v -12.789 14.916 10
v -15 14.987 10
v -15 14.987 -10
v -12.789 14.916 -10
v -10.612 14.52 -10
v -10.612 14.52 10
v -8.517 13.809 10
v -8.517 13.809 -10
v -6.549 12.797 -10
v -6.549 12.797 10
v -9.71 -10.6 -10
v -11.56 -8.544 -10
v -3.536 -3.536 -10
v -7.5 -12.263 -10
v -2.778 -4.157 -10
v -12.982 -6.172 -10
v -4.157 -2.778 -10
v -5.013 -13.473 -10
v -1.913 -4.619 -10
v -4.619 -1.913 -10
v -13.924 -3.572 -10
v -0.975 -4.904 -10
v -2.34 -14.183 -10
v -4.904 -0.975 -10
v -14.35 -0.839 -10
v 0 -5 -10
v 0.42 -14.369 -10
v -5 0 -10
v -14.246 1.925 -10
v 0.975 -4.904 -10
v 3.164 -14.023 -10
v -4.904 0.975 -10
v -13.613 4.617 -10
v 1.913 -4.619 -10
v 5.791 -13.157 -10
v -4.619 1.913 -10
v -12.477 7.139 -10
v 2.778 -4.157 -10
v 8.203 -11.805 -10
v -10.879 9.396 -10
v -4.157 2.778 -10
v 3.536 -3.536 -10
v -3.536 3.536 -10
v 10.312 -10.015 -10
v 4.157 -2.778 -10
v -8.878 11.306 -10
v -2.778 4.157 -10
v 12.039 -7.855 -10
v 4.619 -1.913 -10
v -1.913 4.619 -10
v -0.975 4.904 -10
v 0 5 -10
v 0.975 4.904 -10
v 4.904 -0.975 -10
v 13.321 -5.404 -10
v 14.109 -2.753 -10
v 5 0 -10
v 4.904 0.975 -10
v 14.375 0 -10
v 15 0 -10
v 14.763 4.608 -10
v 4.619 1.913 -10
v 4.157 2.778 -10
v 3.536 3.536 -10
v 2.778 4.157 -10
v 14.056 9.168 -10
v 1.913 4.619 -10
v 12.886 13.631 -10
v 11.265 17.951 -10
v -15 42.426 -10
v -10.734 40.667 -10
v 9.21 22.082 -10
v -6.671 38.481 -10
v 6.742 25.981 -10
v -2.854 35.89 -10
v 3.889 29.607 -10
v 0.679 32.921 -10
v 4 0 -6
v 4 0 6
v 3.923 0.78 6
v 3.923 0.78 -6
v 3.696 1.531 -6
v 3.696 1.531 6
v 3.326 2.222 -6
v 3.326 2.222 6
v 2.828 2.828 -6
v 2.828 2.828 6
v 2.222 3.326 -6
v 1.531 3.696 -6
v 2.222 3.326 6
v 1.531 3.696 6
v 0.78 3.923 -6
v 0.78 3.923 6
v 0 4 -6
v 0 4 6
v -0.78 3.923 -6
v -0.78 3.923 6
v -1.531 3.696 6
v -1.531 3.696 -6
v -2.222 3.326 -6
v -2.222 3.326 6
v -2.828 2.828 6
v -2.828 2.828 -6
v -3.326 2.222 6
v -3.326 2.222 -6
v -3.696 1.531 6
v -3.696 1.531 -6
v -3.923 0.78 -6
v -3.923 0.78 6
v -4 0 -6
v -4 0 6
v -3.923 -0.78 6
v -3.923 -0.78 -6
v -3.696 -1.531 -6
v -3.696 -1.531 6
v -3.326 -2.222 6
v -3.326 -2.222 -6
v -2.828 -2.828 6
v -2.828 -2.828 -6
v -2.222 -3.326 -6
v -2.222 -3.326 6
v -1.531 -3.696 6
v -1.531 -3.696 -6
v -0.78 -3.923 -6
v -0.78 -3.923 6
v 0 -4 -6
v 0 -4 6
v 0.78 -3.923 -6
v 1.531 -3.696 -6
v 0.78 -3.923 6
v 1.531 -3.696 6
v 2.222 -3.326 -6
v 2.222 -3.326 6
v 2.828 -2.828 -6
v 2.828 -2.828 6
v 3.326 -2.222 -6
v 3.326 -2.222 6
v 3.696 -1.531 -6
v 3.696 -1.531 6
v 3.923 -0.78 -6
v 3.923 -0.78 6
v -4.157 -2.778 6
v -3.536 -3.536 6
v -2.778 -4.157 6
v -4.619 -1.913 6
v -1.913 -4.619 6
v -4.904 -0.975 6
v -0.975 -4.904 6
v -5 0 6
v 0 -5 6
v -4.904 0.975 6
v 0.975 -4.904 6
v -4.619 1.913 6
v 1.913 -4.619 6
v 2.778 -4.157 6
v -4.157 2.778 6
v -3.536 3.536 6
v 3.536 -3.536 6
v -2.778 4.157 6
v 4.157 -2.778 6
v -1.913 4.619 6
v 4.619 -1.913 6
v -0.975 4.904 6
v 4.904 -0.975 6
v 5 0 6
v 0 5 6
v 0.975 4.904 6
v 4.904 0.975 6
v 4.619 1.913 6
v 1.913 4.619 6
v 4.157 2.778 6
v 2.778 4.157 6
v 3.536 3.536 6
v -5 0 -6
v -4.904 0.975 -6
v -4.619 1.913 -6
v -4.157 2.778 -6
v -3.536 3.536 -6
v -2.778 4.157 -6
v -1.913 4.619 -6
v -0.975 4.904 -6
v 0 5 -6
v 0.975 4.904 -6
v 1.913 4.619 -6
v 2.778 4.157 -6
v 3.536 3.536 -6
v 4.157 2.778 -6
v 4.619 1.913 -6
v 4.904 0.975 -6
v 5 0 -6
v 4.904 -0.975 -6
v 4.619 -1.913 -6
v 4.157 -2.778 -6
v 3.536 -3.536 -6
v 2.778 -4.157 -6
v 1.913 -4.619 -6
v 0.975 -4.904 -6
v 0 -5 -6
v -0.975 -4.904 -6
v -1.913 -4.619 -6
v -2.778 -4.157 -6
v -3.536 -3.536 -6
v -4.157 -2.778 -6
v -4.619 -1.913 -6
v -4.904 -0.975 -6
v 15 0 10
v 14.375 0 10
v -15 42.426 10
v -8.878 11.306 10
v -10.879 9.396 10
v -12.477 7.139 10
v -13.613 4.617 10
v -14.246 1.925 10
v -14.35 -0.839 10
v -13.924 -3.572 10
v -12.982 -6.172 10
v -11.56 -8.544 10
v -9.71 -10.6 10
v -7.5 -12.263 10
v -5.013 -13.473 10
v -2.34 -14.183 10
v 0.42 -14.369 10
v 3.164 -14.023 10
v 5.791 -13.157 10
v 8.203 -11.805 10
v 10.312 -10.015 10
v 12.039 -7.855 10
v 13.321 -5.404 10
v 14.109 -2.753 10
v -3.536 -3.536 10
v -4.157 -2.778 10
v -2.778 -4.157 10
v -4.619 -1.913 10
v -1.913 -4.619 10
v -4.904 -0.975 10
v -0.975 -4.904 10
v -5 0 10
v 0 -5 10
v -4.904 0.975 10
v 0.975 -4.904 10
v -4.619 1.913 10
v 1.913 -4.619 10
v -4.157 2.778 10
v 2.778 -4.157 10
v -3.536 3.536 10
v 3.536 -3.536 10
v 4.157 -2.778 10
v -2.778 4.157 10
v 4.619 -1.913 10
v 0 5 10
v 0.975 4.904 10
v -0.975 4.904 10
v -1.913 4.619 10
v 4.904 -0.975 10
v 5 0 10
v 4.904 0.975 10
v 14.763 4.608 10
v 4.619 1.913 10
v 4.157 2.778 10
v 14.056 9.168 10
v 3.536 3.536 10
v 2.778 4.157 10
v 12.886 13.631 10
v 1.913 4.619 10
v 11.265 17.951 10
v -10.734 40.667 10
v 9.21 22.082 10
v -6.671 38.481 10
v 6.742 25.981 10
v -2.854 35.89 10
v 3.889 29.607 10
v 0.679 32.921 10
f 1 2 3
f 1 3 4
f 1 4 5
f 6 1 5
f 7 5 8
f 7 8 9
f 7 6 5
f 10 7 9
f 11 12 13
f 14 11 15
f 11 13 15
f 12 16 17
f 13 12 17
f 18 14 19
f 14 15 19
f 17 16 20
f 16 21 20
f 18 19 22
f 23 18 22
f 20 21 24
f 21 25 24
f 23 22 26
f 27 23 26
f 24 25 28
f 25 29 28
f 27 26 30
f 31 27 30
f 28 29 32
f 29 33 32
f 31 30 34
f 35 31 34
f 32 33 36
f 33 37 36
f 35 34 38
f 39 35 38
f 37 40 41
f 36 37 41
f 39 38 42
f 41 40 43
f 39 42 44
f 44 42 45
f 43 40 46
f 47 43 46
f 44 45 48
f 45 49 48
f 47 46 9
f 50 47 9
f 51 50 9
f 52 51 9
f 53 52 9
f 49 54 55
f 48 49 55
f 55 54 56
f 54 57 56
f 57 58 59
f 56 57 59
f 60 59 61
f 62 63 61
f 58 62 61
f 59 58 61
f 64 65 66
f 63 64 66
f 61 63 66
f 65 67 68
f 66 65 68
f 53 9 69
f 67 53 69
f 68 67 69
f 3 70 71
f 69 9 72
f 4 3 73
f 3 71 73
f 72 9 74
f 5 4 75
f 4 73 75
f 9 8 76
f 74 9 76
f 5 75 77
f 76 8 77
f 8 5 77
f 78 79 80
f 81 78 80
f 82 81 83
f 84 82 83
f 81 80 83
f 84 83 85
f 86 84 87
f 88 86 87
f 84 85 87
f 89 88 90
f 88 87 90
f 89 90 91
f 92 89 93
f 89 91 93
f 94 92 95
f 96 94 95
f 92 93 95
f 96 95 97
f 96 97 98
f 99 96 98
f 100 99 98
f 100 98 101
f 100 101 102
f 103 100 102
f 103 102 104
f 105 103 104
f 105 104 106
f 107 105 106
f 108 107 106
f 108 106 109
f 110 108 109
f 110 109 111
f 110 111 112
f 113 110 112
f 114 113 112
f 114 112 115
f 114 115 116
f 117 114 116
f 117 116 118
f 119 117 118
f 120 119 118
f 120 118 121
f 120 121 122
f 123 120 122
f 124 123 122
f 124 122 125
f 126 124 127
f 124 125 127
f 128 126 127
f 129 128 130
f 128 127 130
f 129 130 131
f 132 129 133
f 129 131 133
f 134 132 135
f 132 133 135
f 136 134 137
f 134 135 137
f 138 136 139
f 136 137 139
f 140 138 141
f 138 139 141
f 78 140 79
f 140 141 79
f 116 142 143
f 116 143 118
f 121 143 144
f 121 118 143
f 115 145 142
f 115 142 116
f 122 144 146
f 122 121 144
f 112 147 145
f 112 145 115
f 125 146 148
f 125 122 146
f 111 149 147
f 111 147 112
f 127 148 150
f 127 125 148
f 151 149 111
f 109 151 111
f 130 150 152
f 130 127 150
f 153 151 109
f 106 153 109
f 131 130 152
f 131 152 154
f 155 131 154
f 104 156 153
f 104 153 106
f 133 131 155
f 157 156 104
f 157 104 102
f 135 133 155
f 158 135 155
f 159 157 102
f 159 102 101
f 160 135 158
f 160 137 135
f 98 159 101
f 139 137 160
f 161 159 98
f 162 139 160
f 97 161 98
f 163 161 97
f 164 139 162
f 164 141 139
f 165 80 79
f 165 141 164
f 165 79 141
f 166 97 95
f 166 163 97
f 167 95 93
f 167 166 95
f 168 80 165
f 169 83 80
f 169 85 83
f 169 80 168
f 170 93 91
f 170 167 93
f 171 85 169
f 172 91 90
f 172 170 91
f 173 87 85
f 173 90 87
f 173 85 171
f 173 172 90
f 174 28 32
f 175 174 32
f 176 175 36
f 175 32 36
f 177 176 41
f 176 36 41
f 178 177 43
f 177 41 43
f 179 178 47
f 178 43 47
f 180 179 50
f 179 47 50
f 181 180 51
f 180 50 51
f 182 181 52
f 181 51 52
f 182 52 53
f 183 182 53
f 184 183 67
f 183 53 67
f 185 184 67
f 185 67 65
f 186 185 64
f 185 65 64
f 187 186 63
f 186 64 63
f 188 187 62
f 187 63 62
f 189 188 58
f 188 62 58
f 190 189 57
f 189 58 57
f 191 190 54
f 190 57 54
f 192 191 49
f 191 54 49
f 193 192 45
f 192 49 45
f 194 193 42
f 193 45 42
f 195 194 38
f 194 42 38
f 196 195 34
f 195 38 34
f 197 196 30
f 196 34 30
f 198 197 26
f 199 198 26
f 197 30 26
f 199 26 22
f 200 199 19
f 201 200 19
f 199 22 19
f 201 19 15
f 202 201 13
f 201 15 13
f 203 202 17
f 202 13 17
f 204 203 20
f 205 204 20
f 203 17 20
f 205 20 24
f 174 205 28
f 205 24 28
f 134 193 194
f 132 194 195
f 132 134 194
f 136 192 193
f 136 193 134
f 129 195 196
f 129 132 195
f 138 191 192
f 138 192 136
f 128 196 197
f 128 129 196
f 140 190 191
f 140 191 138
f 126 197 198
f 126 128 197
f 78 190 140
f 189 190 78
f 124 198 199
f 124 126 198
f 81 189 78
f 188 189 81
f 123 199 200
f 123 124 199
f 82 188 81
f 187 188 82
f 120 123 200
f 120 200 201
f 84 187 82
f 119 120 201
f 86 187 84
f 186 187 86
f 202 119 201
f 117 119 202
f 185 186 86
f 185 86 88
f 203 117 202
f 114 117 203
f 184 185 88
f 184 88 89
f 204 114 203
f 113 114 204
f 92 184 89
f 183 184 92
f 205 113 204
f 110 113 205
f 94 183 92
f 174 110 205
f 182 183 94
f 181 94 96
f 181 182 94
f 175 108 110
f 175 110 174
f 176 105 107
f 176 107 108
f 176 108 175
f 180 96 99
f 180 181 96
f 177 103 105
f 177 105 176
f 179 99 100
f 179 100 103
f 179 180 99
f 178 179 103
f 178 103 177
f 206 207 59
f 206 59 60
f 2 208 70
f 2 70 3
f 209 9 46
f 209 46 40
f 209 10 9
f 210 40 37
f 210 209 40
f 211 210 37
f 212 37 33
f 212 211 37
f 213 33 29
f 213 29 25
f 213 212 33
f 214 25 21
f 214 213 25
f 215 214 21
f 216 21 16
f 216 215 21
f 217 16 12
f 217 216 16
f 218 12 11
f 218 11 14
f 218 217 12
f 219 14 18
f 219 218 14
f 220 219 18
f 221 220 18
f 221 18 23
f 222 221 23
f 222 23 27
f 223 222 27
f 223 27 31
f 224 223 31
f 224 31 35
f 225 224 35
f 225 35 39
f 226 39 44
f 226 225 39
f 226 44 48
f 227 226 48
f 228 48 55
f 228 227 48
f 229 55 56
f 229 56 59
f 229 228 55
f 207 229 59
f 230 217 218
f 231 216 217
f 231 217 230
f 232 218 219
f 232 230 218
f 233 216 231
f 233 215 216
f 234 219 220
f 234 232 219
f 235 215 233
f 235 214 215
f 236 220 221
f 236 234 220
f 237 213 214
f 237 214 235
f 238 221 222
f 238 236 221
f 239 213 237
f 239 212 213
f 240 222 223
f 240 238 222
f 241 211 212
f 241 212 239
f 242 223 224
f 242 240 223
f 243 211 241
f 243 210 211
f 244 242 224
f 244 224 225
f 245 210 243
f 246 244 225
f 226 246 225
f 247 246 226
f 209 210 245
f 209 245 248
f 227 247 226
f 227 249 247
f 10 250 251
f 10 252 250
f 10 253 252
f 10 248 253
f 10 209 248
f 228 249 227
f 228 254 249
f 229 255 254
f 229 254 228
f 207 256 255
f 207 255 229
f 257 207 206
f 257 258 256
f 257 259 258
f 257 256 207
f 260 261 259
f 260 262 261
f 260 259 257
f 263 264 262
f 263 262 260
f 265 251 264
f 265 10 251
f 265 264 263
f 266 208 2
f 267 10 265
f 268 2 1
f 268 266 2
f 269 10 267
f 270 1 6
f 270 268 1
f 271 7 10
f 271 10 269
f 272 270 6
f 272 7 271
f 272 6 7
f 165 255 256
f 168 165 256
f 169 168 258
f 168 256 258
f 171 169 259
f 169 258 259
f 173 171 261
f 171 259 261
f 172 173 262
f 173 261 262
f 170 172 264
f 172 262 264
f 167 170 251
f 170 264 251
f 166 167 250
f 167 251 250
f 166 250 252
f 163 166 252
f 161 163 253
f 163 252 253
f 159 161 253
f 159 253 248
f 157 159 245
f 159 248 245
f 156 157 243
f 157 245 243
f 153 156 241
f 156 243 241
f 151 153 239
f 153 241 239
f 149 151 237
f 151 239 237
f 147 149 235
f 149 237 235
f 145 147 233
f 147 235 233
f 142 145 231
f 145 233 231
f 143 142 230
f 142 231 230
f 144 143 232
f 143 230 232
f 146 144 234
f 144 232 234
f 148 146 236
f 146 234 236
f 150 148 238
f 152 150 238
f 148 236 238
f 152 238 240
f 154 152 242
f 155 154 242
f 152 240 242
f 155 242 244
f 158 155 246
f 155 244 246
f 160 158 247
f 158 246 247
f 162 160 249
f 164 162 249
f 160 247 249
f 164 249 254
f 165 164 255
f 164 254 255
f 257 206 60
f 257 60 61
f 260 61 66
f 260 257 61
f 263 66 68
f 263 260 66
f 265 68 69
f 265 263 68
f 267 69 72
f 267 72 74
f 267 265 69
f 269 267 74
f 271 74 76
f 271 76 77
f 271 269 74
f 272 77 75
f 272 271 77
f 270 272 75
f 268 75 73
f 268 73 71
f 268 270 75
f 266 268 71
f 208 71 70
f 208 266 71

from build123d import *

# Parameters (mm, degrees)
SKETCH_1_R           = 14.375
EXTRUDE_1_DEPTH      = 10
EXTRUDE_1_DEPTH_BACK = 10
EXTRUDE_2_DEPTH      = 20
SKETCH_10_R          = 4
CUT_EXTRUDE_1_DEPTH  = 21
SKETCH_11_R          = 5
CUT_EXTRUDE_2_DEPTH  = 4
SKETCH_12_R          = 5
CUT_EXTRUDE_3_DEPTH  = 4


with BuildPart() as part:
    # 草图1 → 凸台-拉伸1 (new body, two sides)
    with BuildSketch(Plane.XY) as extrude_1_sk:
        Circle(SKETCH_1_R)
    extrude(amount=EXTRUDE_1_DEPTH)
    extrude(extrude_1_sk.sketch, amount=-EXTRUDE_1_DEPTH_BACK)

    # 草图2 → 凸台-拉伸2 (add)
    with BuildSketch(Plane.XY.offset(10)):
        with BuildLine():
            Line((-15, 42.426406871), (-15, 14.98697351))
            ThreePointArc((-15, 14.98697351), (-3.991720171, 10.825317547), (0.625, 0))
            Line((0.625, 0), (15, 0))
            ThreePointArc((15, 0), (6.742346142, 25.980762114), (-15, 42.426406871))
        make_face()
    extrude(amount=-EXTRUDE_2_DEPTH)

    # 草图10 → 切除-拉伸1 (cut, through all)
    with BuildSketch(Plane.XY.offset(10)):
        Circle(SKETCH_10_R)
    extrude(amount=-CUT_EXTRUDE_1_DEPTH, mode=Mode.SUBTRACT)

    # 草图11 → 切除-拉伸2 (cut)
    with BuildSketch(Plane(origin=(0, 0, -10), x_dir=(-1, 0, 0), z_dir=(0, 0, -1))):
        Circle(SKETCH_11_R)
    extrude(amount=-CUT_EXTRUDE_2_DEPTH, mode=Mode.SUBTRACT)

    # 草图12 → 切除-拉伸3 (cut)
    with BuildSketch(Plane.XY.offset(10)):
        Circle(SKETCH_12_R)
    extrude(amount=-CUT_EXTRUDE_3_DEPTH, mode=Mode.SUBTRACT)


solid = part.part
